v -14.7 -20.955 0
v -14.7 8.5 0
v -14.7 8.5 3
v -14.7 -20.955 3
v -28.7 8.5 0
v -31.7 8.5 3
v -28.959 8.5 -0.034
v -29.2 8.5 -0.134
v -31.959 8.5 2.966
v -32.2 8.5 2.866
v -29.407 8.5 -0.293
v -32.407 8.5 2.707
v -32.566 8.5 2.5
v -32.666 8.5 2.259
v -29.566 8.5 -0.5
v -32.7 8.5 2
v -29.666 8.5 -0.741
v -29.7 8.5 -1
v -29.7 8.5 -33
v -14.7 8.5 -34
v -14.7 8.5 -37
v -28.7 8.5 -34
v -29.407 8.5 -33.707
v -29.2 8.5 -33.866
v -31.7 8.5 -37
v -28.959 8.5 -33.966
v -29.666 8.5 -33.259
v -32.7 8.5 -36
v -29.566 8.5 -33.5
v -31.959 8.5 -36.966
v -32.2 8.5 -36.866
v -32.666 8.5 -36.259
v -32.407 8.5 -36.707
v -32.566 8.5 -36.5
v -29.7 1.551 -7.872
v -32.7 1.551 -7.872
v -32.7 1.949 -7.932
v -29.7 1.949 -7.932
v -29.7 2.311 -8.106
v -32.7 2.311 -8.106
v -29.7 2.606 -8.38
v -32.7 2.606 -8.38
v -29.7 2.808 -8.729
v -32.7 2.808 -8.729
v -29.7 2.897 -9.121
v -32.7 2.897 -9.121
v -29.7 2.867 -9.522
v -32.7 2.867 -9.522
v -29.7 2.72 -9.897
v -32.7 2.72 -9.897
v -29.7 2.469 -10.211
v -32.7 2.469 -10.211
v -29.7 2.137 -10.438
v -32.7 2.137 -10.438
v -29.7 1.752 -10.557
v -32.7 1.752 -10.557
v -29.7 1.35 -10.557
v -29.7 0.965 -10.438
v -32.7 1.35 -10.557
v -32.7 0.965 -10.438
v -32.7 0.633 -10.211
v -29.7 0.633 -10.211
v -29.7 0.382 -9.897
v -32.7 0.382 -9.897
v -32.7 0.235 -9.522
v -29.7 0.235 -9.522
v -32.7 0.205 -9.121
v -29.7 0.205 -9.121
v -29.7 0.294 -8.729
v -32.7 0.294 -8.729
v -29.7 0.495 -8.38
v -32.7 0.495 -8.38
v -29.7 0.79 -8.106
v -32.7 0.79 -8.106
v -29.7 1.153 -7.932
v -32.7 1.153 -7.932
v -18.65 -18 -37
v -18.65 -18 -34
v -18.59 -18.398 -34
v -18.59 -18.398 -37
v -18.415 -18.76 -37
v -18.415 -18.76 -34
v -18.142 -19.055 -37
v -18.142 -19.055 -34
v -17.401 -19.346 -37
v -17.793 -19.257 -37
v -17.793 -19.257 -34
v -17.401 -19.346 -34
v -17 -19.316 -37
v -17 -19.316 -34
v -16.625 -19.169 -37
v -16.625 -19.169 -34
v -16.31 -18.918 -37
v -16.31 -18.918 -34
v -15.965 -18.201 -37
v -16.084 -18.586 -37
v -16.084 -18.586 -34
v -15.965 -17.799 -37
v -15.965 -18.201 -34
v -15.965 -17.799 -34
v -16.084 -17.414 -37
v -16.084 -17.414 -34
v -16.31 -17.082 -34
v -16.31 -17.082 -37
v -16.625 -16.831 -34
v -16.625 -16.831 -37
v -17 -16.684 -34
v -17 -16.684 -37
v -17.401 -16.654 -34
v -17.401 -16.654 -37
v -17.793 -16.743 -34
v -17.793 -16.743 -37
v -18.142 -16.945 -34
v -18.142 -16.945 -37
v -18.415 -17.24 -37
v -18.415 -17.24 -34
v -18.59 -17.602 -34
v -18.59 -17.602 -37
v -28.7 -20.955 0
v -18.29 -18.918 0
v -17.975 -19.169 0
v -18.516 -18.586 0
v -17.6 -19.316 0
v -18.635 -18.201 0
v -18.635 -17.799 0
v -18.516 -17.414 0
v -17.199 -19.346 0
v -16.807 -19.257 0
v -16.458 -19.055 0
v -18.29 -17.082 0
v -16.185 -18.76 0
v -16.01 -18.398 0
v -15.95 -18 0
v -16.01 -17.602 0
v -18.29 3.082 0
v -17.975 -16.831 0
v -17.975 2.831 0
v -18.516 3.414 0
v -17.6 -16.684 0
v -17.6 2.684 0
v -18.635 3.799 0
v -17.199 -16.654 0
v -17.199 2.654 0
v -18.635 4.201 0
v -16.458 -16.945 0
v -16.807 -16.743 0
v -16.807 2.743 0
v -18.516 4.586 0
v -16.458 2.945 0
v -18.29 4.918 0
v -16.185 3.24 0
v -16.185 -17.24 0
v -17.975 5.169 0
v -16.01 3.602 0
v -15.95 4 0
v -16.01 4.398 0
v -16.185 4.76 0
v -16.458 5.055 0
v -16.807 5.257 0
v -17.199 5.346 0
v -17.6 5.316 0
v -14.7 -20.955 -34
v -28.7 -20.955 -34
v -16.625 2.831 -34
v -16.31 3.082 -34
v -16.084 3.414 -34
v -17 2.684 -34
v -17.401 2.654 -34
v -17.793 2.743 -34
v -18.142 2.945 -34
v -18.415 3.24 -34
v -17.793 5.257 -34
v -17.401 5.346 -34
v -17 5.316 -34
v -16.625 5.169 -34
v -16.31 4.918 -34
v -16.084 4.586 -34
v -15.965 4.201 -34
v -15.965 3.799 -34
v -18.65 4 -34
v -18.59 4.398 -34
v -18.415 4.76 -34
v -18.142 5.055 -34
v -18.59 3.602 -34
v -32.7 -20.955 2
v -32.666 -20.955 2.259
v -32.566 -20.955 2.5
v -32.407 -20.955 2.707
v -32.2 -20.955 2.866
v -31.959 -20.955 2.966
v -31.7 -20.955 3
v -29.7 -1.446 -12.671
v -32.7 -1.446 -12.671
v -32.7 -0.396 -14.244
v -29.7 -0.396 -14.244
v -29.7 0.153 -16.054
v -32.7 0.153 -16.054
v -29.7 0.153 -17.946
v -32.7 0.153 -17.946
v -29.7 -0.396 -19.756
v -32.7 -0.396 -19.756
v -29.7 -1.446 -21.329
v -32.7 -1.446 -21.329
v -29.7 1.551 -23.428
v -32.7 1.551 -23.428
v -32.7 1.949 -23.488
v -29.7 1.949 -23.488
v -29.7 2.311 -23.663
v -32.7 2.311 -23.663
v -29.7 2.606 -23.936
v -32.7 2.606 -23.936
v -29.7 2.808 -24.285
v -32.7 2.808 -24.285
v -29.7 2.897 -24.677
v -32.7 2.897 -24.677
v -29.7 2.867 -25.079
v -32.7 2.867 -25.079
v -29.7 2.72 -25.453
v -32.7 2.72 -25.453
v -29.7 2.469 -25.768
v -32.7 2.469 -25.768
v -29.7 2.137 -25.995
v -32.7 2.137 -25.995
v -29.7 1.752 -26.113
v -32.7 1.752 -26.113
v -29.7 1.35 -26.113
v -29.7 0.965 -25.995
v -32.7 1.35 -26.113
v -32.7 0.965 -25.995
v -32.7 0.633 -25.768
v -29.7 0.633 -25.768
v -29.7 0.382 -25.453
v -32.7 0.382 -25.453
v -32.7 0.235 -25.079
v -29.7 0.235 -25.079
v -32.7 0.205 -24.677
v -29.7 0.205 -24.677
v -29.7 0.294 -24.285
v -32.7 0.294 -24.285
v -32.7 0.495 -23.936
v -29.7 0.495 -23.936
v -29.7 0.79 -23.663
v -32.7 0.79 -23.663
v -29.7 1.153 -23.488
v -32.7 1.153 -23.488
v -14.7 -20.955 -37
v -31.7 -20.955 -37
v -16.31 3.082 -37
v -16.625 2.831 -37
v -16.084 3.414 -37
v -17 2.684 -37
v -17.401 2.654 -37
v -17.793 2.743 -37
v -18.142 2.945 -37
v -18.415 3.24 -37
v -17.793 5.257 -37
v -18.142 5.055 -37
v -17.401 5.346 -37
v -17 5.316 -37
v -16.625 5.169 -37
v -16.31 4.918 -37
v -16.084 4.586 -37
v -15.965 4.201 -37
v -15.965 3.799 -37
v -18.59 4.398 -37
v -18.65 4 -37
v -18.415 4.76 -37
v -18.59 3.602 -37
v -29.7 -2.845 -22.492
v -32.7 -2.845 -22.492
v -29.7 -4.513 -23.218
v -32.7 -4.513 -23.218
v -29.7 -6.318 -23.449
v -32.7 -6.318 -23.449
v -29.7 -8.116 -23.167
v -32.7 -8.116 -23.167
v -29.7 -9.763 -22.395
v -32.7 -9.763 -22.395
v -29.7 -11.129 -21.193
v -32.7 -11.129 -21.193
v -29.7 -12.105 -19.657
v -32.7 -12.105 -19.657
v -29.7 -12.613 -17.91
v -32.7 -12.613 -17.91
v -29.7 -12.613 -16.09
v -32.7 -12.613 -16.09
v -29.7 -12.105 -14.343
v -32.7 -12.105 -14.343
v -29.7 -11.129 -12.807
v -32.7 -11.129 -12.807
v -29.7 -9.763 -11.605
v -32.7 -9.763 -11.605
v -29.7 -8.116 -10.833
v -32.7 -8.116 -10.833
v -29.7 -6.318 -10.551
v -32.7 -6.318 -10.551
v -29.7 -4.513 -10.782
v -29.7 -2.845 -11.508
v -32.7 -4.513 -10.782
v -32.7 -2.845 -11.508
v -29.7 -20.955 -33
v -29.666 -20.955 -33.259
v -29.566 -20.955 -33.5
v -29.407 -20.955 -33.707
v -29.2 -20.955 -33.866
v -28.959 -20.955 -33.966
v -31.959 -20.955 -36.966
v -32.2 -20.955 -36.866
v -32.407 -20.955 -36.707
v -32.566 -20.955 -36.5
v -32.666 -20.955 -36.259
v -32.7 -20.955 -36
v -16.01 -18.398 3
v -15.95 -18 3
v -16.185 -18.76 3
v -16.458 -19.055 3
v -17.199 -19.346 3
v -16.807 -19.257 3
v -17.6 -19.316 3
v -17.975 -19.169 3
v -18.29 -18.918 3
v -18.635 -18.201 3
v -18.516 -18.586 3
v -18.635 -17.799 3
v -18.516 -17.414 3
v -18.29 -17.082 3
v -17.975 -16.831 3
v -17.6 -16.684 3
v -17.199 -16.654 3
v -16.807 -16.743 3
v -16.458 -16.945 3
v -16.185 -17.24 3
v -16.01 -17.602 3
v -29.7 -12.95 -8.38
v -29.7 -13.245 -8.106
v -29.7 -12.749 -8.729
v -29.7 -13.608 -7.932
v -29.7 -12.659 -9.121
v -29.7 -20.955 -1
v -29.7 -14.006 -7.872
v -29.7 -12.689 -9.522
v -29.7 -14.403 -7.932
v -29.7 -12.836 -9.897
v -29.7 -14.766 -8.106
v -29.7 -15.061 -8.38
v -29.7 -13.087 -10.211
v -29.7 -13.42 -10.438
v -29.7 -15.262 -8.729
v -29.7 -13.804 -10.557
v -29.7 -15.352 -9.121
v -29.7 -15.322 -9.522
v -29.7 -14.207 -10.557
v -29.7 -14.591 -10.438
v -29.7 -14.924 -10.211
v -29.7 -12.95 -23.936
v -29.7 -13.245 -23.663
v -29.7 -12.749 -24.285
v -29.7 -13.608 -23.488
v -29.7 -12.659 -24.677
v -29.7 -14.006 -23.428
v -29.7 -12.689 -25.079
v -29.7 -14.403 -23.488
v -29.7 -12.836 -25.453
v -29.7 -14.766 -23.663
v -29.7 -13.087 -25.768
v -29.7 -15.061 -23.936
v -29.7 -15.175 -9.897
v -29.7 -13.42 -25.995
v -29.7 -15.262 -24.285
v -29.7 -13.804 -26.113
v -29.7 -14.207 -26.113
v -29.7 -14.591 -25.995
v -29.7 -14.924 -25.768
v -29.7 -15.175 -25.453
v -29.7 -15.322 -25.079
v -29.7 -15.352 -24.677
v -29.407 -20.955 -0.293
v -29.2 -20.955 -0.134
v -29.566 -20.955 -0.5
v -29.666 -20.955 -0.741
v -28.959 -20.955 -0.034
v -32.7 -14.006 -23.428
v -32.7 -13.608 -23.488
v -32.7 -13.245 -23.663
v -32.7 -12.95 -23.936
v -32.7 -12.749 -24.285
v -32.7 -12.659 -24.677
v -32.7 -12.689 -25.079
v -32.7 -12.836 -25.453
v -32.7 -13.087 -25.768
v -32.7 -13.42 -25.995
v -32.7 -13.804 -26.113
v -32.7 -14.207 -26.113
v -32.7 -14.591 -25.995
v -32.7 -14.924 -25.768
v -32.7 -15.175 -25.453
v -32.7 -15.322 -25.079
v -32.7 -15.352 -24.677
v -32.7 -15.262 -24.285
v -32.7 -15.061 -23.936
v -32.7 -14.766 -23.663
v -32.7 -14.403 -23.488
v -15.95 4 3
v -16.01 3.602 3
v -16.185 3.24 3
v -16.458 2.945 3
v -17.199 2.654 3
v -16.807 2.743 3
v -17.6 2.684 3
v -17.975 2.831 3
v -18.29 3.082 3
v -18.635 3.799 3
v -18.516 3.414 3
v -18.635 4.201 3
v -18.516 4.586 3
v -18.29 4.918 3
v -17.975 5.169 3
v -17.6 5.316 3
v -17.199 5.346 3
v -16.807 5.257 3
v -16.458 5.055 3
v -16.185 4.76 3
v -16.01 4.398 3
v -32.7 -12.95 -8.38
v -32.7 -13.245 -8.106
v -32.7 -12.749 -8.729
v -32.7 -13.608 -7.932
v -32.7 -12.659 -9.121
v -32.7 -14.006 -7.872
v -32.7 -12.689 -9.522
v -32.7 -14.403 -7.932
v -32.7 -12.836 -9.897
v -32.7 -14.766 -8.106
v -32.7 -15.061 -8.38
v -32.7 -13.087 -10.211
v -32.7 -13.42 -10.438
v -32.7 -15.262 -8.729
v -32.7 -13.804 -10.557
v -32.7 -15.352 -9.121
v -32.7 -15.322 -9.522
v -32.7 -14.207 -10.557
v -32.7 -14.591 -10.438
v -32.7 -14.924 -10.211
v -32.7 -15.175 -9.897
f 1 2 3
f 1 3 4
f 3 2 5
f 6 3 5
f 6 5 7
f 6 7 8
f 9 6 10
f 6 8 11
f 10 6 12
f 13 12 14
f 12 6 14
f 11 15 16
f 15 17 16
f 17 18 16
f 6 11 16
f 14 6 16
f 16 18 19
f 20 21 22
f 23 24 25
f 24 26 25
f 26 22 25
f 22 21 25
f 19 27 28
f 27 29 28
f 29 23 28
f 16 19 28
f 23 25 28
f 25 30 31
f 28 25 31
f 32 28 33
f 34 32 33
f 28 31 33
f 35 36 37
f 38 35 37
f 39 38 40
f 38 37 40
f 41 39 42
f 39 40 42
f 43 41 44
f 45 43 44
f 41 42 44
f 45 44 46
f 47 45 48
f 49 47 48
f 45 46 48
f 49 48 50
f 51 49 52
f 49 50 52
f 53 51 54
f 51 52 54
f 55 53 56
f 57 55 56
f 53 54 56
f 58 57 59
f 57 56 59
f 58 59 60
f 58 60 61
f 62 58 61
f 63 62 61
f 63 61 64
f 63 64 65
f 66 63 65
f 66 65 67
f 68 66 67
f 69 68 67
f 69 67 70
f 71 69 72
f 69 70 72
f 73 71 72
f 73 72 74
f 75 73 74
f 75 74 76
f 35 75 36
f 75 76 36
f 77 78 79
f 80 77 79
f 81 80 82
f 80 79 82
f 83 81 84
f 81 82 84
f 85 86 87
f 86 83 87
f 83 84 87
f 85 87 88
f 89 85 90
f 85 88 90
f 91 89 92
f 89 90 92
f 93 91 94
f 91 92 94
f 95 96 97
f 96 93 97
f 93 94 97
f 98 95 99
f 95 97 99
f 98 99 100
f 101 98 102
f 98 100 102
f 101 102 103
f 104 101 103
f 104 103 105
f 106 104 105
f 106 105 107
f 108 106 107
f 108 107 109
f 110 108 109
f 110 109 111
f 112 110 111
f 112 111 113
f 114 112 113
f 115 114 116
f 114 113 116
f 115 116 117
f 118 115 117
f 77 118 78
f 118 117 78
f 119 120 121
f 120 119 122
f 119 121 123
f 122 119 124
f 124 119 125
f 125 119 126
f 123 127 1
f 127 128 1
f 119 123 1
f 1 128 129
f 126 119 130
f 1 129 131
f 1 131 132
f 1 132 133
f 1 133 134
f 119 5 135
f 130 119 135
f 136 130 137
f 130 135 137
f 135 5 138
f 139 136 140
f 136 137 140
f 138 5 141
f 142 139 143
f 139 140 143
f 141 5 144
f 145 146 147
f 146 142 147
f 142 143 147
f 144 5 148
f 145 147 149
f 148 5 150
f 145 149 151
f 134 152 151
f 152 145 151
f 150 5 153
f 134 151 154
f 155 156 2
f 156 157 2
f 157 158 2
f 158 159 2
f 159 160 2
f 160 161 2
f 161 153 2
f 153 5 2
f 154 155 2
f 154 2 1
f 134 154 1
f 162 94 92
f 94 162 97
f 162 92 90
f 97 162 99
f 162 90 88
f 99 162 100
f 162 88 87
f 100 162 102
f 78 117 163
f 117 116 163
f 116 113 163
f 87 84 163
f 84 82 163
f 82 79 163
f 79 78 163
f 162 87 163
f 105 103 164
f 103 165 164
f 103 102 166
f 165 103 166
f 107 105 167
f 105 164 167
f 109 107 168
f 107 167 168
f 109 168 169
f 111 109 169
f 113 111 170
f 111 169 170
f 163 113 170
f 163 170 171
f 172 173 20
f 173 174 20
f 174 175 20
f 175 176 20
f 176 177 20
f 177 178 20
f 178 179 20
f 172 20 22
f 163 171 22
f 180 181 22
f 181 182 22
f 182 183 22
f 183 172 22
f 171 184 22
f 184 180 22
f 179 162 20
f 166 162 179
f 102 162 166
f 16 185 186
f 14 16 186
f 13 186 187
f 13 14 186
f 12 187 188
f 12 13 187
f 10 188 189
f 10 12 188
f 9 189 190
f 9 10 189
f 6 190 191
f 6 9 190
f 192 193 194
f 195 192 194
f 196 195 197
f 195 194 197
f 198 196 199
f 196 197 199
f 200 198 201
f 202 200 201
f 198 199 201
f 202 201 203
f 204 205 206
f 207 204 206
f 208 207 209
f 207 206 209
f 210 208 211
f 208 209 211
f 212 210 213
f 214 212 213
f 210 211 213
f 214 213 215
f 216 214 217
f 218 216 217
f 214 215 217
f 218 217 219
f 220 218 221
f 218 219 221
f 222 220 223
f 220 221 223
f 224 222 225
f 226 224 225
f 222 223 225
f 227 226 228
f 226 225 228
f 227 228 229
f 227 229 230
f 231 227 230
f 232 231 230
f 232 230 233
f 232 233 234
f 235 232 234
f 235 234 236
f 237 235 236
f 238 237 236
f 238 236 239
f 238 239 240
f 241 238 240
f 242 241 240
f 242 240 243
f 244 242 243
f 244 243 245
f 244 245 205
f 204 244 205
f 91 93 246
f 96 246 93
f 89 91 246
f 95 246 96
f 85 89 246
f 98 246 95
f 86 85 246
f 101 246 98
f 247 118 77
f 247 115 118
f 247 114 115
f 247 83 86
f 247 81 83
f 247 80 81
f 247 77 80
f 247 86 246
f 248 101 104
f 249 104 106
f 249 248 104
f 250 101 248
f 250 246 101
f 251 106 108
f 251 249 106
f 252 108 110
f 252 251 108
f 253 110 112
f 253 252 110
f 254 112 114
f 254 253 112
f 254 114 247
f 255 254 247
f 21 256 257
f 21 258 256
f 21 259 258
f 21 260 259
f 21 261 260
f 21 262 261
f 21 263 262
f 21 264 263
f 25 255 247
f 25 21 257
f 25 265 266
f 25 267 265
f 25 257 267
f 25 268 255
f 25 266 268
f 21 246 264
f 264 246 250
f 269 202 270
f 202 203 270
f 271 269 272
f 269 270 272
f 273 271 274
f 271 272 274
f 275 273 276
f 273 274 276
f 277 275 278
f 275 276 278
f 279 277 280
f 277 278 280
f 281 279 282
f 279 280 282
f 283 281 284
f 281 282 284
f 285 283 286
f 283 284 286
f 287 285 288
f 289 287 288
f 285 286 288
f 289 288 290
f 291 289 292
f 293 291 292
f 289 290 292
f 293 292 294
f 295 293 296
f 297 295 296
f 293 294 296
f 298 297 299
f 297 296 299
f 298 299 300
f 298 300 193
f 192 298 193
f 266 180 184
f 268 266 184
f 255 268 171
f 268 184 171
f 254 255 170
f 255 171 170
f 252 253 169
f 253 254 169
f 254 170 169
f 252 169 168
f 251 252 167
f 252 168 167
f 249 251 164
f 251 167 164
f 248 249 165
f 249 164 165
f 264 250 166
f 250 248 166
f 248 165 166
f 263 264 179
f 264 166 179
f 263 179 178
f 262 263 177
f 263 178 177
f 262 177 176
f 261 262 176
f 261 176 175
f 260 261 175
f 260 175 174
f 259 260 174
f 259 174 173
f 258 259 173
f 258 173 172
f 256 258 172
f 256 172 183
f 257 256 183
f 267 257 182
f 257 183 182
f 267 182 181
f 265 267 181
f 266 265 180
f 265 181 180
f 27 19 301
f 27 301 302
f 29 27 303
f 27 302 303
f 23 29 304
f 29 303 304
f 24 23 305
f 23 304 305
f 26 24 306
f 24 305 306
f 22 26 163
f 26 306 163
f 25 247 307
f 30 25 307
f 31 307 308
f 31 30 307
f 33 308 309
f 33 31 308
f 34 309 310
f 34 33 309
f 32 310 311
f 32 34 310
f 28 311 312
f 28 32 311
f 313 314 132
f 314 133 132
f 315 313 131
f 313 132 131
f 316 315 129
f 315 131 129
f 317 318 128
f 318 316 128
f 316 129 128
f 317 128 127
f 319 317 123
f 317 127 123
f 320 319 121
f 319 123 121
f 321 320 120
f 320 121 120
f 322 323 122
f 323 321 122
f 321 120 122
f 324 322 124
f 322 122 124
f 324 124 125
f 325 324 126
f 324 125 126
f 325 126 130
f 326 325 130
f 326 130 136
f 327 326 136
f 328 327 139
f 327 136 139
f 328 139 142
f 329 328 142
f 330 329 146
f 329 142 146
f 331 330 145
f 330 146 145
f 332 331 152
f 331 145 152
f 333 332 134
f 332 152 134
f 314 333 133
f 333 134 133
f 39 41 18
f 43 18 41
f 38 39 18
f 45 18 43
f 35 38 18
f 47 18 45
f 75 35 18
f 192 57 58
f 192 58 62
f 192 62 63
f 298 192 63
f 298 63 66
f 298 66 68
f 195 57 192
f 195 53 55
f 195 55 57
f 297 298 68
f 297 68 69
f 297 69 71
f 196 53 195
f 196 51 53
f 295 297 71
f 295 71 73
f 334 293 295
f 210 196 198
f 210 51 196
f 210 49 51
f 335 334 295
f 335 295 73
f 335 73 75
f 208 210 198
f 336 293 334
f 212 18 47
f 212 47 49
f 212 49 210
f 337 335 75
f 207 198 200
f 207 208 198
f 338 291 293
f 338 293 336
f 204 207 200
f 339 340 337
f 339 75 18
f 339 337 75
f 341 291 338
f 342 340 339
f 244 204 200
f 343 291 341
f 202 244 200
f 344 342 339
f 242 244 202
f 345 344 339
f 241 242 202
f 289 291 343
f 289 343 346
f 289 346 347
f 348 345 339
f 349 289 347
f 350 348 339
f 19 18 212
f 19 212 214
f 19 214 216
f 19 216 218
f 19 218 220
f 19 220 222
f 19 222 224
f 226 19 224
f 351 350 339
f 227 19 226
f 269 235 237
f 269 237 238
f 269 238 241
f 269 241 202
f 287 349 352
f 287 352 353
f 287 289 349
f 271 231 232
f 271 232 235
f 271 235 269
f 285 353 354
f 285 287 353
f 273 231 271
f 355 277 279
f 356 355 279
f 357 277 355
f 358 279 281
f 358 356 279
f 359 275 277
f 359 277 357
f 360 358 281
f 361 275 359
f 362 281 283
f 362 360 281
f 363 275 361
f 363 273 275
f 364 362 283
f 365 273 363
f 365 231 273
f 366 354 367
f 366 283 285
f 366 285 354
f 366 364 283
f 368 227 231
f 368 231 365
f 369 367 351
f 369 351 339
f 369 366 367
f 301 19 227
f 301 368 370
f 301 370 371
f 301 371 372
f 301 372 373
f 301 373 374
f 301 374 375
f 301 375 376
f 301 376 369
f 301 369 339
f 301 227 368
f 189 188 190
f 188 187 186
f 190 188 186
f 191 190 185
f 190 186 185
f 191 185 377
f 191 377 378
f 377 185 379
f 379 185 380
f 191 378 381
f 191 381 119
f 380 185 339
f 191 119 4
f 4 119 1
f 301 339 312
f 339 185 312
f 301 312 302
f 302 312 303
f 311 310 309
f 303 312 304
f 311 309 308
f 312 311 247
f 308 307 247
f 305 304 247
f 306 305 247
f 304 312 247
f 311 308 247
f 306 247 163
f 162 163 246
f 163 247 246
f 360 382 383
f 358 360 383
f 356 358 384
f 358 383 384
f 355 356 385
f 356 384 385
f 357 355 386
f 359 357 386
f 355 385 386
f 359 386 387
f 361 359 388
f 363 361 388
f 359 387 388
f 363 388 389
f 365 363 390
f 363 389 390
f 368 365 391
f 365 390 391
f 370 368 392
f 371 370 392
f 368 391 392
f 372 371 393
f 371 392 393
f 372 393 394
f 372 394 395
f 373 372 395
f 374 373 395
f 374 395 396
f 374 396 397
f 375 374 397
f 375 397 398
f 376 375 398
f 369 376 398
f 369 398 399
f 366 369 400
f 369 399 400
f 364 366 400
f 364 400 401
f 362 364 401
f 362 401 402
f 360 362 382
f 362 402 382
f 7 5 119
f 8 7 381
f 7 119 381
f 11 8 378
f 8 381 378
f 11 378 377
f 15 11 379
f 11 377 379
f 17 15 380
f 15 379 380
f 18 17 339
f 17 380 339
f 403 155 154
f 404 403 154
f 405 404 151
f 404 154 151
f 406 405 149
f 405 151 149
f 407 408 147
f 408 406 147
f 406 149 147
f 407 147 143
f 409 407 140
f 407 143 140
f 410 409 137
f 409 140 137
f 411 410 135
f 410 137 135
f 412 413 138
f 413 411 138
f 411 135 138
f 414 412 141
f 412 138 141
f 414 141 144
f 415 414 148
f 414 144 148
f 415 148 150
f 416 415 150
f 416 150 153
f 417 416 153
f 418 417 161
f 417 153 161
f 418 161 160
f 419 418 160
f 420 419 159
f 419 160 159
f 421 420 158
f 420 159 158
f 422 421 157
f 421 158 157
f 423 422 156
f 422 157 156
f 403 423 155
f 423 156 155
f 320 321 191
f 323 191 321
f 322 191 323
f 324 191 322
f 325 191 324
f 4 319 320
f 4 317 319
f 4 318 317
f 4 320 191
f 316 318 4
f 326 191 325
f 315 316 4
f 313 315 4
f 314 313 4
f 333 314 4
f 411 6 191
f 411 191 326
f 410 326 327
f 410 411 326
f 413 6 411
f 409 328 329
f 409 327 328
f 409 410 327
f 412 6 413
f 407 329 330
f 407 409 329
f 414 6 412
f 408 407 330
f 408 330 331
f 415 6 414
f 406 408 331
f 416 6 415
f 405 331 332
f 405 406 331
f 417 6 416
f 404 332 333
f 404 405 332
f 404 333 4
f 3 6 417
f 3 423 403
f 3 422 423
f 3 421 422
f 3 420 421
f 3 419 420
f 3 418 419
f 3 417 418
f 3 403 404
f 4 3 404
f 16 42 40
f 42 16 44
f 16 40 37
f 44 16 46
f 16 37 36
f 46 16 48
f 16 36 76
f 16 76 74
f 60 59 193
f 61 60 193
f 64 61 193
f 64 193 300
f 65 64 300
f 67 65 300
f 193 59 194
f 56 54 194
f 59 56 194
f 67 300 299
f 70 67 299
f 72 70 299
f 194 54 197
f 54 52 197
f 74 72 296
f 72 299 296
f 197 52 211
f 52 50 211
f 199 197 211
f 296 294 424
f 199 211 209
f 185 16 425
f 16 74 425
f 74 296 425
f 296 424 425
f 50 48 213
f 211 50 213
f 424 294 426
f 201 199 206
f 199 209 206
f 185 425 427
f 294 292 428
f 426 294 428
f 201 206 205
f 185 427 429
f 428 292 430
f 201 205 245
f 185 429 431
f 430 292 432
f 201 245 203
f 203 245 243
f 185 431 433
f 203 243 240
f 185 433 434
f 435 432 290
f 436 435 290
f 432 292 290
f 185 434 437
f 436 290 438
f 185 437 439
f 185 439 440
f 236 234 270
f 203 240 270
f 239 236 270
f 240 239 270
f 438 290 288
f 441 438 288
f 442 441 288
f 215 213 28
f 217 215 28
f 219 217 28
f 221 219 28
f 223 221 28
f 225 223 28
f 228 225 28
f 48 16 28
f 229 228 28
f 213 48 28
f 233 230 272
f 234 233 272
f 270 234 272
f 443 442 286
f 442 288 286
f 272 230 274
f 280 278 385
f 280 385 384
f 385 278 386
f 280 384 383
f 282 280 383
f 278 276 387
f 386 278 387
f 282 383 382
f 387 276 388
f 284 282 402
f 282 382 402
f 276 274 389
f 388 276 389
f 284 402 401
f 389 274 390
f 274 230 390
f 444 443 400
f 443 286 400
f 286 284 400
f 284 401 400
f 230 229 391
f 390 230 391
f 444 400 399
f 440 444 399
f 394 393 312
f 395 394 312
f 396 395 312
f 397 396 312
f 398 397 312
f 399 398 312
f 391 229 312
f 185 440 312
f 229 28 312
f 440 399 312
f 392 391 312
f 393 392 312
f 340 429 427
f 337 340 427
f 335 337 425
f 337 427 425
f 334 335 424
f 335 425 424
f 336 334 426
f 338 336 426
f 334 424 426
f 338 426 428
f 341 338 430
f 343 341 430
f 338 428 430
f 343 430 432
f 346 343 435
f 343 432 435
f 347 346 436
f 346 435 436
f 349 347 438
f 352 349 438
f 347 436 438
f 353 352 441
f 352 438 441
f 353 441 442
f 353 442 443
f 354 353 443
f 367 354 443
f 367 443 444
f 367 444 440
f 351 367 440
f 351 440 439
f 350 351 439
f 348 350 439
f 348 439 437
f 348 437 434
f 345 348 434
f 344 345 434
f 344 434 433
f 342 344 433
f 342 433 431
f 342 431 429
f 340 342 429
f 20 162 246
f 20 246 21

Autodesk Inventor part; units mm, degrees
ref_plane "YZ Plane" through (0, 0, 0) normal (1, 0, 0) x (0, 1, 0)
ref_plane "XZ Plane" through (0, 0, 0) normal (0, 1, 0) x (-1, 0, 0)
ref_plane "XY Plane" through (0, 0, 0) normal (0, 0, 1) x (1, 0, 0)
ref_plane "작업 평면1" through (0, 0, -34) normal (0, 0, -1) x (-1, 0, 0)
sketch "스케치1" plane through (0, 0, -34) normal (0, 0, -1) x (-1, 0, 0)
  circle A0 centre (17.3, -18) radius 1.35 projected
  line L0 (20.1, -44.6) -> (20.1, 8.5) projected
  line L1 (14.5, -42) -> (14.5, 11.5) projected
  circle A1 centre (17.3, 4) radius 1.35 projected
  circle A2 centre (17.3, -18) radius 1.45
  circle A3 centre (17.3, 4) radius 1.45
  line L2 (14.7, -42) -> (14.7, 11.5)
  line L3 (14.7, 11.5) -> (20.1, 8.5)
  line L4 (14.7, -20.9546) -> (32.7, -20.9546)
  line L5 (32.7, -20.9546) -> (32.7, 8.5)
  line L6 (32.7, 8.5) -> (20.1, 8.5)
  line L7 (32.7, -20.9546) -> (26.7, -20.9546)
  line L8 (26.7, -20.9546) -> (26.7, 8.5)
  line L9 (26.7, 8.5) -> (32.7, 8.5)
  line L10 (32.7, 8.5) -> (32.7, -20.9546)
  line L11 (20.1, 8.5) -> (14.7, 8.5)
  point P0 (0, 0)
  dimension "d0" = 0.1
  dimension "d1" = 0.1
  dimension "d2" = 0.2
  dimension "d3" = 18
  dimension "d8" = 6
extrude "돌출1" add sketch "스케치1" along normal blind 3 contours L4 L2 L11 L0 | L0 L6 L8 L4 | L8 L6 L5 L4 | A2 | A3
sketch "스케치2" plane through (0, 0, -34) normal (0, 0, 1) x (1, 0, 0)
  line L0 (-20.1, 8.5) -> (-14.7, 11.5) projected
  line L1 (-14.7, 8.5) -> (-14.7, -20.9546) projected
  line L2 (-20.1, -44.6) -> (-20.1, 8.5) projected
  line L3 (-32.7, 8.5) -> (-14.7, 8.5) projected
  line L4 (-32.7, -20.9546) -> (-32.7, 8.5) projected
  line L5 (-14.7, -20.9546) -> (-32.7, -20.9546) projected
  line L6 (-20.1, -20.9546) -> (-32.7, -20.9546)
  line L7 (-32.7, -20.9546) -> (-32.7, 8.5)
  line L8 (-32.7, 8.5) -> (-20.1, 8.5)
  line L9 (-20.1, 8.5) -> (-20.1, -20.9546)
  line L10 (-20.1, -20.9546) -> (-14.7, -20.9546)
  line L11 (-14.7, 11.5) -> (-20.1, 8.5)
  circle A0 centre (-17.3, -18) radius 1.45 projected
  circle A1 centre (-17.3, 4) radius 1.35 projected
  circle A2 centre (-17.3, 4) radius 1.45 projected
  circle A3 centre (-17.3, 4) radius 1.45
  circle A4 centre (-17.3, -18) radius 1.45
  point P0 (0, 0)
ref_plane "작업 평면2" through (0, 0, 0) normal (0, 0, 1) x (1, 0, 0)
sketch "스케치3" plane through (0, 0, 0) normal (0, 0, 1) x (1, 0, 0)
  line L0 (-32.7, 8.5) -> (-14.7, 8.5) projected
  line L1 (-32.7, -20.9546) -> (-32.7, 8.5) projected
  line L2 (-14.7, -20.9546) -> (-32.7, -20.9546) projected
  line L3 (-14.7, 8.5) -> (-14.7, -20.9546) projected
  line L4 (-20.1, -20.9546) -> (-32.7, -20.9546)
  line L5 (-32.7, -20.9546) -> (-32.7, 8.5)
  line L6 (-32.7, 8.5) -> (-20.1, 8.5)
  line L7 (-20.1, 8.5) -> (-20.1, -20.9546)
  line L8 (-32.7, -20.9546) -> (-20.1, -20.9546)
  line L9 (-20.1, -20.9546) -> (-20.1, 8.5)
  line L10 (-20.1, 8.5) -> (-32.7, 8.5)
  line L11 (-32.7, 8.5) -> (-32.7, -20.9546)
  line L12 (-20.1, -20.9546) -> (-14.7, -20.9546)
  line L13 (-14.7, 8.5) -> (-14.7, -20.9546) projected
  line L14 (-14.7, 11.5) -> (-20.1, 8.5)
  circle A0 centre (-17.3, -18) radius 1.45
  circle A1 centre (-17.3, 4) radius 1.45
  circle A2 centre (-17.3, 4) radius 1.35
  circle A3 centre (-17.3, -18) radius 1.35
  point P0 (0, 0)
  dimension "d26" = 2.7
  dimension "d27" = 2.7
extrude "돌출2" add sketch "스케치3" along normal blind 3 contours L0 L7 L2 L1 | L0 L3 L2 L7 | A0 | A1
sketch "스케치4" plane through (0, 0, -34) normal (0, 0, 1) x (1, 0, 0)
  line L0 (-14.7, -20.9546) -> (-14.7, 8.5) projected
  line L1 (-14.7, 8.5) -> (-32.7, 8.5) projected
  line L2 (-32.7, 8.5) -> (-32.7, -20.9546) projected
  line L3 (-32.7, -20.9546) -> (-14.7, -20.9546) projected
  line L4 (-32.7, 8.5) -> (-26.7, 8.5)
  line L5 (-26.7, -20.9546) -> (-32.7, -20.9546)
  line L6 (-32.7, -20.9546) -> (-32.7, 8.5)
  line L7 (-32.7, 8.5) -> (-29.7, 8.5)
  line L8 (-29.7, 8.5) -> (-29.7, -20.9546)
  line L9 (-29.7, -20.9546) -> (-32.7, -20.9546)
  line L10 (-32.7, -20.9546) -> (-32.7, 8.5)
  point P0 (0, 0)
  point P1 (-29.7, -20.9546)
extrude "돌출3" add sketch "스케치4" along normal up to surface (34 mm away) contours L3 L2 L1 L8
sketch "스케치5" plane through (-32.7, -20.9546, -37) normal (-1, 0, 0) x (0, 0, 1)
  line L0 (40, 29.4546) -> (0, 29.4546) projected
  line L1 (0, 0) -> (0, 29.4546) projected
  line L2 (40, 0) -> (0, 0) projected
  line L3 (40, 29.4546) -> (40, 0) projected
  line L4 (40, 0) -> (0, 0) projected
  circle A0 centre (20, 14.7273) radius 14
  arc A1 (15, 20.2502) -> (25, 20.2502) centre (20, 14.7273) ccw
  circle A2 centre (20, 14.7273) radius 1.6
  circle A3 centre (12.2218, 22.5055) radius 1.35
  circle A4 centre (27.7782, 22.5055) radius 1.35
  circle A5 centre (27.7782, 6.9491) radius 1.35
  circle A6 centre (12.2218, 6.9491) radius 1.35
  arc A7 (15.6711, 19.5089) -> (24.3289, 19.5089) centre (20, 14.7273) ccw
  circle A8 centre (20, 14.7273) radius 6.45
  point P0 (37, 20.9546)
  point P1 (24.3289, 19.5089)
  point P2 (15.6711, 19.5089)
  dimension "d20" = 3.2
  dimension "d21" = 2.7
  dimension "d22" = 2.7
  dimension "d23" = 2.7
  dimension "d24" = 2.7
  dimension "d25" = 1
extrude "돌출4" cut sketch "스케치5" against normal blind 10 contours A2 | A3 | A4 | A5 | A6 | A8 A7
fillet "모깎기1" radius 1 4 edges at (-32.7, -6.2273, 3) (-32.7, -6.2273, -37) (-29.7, -6.2273, -34) (-29.7, -6.2273, 0)
properties part number "3D_ankle2" material "PMMA 플라스틱"
